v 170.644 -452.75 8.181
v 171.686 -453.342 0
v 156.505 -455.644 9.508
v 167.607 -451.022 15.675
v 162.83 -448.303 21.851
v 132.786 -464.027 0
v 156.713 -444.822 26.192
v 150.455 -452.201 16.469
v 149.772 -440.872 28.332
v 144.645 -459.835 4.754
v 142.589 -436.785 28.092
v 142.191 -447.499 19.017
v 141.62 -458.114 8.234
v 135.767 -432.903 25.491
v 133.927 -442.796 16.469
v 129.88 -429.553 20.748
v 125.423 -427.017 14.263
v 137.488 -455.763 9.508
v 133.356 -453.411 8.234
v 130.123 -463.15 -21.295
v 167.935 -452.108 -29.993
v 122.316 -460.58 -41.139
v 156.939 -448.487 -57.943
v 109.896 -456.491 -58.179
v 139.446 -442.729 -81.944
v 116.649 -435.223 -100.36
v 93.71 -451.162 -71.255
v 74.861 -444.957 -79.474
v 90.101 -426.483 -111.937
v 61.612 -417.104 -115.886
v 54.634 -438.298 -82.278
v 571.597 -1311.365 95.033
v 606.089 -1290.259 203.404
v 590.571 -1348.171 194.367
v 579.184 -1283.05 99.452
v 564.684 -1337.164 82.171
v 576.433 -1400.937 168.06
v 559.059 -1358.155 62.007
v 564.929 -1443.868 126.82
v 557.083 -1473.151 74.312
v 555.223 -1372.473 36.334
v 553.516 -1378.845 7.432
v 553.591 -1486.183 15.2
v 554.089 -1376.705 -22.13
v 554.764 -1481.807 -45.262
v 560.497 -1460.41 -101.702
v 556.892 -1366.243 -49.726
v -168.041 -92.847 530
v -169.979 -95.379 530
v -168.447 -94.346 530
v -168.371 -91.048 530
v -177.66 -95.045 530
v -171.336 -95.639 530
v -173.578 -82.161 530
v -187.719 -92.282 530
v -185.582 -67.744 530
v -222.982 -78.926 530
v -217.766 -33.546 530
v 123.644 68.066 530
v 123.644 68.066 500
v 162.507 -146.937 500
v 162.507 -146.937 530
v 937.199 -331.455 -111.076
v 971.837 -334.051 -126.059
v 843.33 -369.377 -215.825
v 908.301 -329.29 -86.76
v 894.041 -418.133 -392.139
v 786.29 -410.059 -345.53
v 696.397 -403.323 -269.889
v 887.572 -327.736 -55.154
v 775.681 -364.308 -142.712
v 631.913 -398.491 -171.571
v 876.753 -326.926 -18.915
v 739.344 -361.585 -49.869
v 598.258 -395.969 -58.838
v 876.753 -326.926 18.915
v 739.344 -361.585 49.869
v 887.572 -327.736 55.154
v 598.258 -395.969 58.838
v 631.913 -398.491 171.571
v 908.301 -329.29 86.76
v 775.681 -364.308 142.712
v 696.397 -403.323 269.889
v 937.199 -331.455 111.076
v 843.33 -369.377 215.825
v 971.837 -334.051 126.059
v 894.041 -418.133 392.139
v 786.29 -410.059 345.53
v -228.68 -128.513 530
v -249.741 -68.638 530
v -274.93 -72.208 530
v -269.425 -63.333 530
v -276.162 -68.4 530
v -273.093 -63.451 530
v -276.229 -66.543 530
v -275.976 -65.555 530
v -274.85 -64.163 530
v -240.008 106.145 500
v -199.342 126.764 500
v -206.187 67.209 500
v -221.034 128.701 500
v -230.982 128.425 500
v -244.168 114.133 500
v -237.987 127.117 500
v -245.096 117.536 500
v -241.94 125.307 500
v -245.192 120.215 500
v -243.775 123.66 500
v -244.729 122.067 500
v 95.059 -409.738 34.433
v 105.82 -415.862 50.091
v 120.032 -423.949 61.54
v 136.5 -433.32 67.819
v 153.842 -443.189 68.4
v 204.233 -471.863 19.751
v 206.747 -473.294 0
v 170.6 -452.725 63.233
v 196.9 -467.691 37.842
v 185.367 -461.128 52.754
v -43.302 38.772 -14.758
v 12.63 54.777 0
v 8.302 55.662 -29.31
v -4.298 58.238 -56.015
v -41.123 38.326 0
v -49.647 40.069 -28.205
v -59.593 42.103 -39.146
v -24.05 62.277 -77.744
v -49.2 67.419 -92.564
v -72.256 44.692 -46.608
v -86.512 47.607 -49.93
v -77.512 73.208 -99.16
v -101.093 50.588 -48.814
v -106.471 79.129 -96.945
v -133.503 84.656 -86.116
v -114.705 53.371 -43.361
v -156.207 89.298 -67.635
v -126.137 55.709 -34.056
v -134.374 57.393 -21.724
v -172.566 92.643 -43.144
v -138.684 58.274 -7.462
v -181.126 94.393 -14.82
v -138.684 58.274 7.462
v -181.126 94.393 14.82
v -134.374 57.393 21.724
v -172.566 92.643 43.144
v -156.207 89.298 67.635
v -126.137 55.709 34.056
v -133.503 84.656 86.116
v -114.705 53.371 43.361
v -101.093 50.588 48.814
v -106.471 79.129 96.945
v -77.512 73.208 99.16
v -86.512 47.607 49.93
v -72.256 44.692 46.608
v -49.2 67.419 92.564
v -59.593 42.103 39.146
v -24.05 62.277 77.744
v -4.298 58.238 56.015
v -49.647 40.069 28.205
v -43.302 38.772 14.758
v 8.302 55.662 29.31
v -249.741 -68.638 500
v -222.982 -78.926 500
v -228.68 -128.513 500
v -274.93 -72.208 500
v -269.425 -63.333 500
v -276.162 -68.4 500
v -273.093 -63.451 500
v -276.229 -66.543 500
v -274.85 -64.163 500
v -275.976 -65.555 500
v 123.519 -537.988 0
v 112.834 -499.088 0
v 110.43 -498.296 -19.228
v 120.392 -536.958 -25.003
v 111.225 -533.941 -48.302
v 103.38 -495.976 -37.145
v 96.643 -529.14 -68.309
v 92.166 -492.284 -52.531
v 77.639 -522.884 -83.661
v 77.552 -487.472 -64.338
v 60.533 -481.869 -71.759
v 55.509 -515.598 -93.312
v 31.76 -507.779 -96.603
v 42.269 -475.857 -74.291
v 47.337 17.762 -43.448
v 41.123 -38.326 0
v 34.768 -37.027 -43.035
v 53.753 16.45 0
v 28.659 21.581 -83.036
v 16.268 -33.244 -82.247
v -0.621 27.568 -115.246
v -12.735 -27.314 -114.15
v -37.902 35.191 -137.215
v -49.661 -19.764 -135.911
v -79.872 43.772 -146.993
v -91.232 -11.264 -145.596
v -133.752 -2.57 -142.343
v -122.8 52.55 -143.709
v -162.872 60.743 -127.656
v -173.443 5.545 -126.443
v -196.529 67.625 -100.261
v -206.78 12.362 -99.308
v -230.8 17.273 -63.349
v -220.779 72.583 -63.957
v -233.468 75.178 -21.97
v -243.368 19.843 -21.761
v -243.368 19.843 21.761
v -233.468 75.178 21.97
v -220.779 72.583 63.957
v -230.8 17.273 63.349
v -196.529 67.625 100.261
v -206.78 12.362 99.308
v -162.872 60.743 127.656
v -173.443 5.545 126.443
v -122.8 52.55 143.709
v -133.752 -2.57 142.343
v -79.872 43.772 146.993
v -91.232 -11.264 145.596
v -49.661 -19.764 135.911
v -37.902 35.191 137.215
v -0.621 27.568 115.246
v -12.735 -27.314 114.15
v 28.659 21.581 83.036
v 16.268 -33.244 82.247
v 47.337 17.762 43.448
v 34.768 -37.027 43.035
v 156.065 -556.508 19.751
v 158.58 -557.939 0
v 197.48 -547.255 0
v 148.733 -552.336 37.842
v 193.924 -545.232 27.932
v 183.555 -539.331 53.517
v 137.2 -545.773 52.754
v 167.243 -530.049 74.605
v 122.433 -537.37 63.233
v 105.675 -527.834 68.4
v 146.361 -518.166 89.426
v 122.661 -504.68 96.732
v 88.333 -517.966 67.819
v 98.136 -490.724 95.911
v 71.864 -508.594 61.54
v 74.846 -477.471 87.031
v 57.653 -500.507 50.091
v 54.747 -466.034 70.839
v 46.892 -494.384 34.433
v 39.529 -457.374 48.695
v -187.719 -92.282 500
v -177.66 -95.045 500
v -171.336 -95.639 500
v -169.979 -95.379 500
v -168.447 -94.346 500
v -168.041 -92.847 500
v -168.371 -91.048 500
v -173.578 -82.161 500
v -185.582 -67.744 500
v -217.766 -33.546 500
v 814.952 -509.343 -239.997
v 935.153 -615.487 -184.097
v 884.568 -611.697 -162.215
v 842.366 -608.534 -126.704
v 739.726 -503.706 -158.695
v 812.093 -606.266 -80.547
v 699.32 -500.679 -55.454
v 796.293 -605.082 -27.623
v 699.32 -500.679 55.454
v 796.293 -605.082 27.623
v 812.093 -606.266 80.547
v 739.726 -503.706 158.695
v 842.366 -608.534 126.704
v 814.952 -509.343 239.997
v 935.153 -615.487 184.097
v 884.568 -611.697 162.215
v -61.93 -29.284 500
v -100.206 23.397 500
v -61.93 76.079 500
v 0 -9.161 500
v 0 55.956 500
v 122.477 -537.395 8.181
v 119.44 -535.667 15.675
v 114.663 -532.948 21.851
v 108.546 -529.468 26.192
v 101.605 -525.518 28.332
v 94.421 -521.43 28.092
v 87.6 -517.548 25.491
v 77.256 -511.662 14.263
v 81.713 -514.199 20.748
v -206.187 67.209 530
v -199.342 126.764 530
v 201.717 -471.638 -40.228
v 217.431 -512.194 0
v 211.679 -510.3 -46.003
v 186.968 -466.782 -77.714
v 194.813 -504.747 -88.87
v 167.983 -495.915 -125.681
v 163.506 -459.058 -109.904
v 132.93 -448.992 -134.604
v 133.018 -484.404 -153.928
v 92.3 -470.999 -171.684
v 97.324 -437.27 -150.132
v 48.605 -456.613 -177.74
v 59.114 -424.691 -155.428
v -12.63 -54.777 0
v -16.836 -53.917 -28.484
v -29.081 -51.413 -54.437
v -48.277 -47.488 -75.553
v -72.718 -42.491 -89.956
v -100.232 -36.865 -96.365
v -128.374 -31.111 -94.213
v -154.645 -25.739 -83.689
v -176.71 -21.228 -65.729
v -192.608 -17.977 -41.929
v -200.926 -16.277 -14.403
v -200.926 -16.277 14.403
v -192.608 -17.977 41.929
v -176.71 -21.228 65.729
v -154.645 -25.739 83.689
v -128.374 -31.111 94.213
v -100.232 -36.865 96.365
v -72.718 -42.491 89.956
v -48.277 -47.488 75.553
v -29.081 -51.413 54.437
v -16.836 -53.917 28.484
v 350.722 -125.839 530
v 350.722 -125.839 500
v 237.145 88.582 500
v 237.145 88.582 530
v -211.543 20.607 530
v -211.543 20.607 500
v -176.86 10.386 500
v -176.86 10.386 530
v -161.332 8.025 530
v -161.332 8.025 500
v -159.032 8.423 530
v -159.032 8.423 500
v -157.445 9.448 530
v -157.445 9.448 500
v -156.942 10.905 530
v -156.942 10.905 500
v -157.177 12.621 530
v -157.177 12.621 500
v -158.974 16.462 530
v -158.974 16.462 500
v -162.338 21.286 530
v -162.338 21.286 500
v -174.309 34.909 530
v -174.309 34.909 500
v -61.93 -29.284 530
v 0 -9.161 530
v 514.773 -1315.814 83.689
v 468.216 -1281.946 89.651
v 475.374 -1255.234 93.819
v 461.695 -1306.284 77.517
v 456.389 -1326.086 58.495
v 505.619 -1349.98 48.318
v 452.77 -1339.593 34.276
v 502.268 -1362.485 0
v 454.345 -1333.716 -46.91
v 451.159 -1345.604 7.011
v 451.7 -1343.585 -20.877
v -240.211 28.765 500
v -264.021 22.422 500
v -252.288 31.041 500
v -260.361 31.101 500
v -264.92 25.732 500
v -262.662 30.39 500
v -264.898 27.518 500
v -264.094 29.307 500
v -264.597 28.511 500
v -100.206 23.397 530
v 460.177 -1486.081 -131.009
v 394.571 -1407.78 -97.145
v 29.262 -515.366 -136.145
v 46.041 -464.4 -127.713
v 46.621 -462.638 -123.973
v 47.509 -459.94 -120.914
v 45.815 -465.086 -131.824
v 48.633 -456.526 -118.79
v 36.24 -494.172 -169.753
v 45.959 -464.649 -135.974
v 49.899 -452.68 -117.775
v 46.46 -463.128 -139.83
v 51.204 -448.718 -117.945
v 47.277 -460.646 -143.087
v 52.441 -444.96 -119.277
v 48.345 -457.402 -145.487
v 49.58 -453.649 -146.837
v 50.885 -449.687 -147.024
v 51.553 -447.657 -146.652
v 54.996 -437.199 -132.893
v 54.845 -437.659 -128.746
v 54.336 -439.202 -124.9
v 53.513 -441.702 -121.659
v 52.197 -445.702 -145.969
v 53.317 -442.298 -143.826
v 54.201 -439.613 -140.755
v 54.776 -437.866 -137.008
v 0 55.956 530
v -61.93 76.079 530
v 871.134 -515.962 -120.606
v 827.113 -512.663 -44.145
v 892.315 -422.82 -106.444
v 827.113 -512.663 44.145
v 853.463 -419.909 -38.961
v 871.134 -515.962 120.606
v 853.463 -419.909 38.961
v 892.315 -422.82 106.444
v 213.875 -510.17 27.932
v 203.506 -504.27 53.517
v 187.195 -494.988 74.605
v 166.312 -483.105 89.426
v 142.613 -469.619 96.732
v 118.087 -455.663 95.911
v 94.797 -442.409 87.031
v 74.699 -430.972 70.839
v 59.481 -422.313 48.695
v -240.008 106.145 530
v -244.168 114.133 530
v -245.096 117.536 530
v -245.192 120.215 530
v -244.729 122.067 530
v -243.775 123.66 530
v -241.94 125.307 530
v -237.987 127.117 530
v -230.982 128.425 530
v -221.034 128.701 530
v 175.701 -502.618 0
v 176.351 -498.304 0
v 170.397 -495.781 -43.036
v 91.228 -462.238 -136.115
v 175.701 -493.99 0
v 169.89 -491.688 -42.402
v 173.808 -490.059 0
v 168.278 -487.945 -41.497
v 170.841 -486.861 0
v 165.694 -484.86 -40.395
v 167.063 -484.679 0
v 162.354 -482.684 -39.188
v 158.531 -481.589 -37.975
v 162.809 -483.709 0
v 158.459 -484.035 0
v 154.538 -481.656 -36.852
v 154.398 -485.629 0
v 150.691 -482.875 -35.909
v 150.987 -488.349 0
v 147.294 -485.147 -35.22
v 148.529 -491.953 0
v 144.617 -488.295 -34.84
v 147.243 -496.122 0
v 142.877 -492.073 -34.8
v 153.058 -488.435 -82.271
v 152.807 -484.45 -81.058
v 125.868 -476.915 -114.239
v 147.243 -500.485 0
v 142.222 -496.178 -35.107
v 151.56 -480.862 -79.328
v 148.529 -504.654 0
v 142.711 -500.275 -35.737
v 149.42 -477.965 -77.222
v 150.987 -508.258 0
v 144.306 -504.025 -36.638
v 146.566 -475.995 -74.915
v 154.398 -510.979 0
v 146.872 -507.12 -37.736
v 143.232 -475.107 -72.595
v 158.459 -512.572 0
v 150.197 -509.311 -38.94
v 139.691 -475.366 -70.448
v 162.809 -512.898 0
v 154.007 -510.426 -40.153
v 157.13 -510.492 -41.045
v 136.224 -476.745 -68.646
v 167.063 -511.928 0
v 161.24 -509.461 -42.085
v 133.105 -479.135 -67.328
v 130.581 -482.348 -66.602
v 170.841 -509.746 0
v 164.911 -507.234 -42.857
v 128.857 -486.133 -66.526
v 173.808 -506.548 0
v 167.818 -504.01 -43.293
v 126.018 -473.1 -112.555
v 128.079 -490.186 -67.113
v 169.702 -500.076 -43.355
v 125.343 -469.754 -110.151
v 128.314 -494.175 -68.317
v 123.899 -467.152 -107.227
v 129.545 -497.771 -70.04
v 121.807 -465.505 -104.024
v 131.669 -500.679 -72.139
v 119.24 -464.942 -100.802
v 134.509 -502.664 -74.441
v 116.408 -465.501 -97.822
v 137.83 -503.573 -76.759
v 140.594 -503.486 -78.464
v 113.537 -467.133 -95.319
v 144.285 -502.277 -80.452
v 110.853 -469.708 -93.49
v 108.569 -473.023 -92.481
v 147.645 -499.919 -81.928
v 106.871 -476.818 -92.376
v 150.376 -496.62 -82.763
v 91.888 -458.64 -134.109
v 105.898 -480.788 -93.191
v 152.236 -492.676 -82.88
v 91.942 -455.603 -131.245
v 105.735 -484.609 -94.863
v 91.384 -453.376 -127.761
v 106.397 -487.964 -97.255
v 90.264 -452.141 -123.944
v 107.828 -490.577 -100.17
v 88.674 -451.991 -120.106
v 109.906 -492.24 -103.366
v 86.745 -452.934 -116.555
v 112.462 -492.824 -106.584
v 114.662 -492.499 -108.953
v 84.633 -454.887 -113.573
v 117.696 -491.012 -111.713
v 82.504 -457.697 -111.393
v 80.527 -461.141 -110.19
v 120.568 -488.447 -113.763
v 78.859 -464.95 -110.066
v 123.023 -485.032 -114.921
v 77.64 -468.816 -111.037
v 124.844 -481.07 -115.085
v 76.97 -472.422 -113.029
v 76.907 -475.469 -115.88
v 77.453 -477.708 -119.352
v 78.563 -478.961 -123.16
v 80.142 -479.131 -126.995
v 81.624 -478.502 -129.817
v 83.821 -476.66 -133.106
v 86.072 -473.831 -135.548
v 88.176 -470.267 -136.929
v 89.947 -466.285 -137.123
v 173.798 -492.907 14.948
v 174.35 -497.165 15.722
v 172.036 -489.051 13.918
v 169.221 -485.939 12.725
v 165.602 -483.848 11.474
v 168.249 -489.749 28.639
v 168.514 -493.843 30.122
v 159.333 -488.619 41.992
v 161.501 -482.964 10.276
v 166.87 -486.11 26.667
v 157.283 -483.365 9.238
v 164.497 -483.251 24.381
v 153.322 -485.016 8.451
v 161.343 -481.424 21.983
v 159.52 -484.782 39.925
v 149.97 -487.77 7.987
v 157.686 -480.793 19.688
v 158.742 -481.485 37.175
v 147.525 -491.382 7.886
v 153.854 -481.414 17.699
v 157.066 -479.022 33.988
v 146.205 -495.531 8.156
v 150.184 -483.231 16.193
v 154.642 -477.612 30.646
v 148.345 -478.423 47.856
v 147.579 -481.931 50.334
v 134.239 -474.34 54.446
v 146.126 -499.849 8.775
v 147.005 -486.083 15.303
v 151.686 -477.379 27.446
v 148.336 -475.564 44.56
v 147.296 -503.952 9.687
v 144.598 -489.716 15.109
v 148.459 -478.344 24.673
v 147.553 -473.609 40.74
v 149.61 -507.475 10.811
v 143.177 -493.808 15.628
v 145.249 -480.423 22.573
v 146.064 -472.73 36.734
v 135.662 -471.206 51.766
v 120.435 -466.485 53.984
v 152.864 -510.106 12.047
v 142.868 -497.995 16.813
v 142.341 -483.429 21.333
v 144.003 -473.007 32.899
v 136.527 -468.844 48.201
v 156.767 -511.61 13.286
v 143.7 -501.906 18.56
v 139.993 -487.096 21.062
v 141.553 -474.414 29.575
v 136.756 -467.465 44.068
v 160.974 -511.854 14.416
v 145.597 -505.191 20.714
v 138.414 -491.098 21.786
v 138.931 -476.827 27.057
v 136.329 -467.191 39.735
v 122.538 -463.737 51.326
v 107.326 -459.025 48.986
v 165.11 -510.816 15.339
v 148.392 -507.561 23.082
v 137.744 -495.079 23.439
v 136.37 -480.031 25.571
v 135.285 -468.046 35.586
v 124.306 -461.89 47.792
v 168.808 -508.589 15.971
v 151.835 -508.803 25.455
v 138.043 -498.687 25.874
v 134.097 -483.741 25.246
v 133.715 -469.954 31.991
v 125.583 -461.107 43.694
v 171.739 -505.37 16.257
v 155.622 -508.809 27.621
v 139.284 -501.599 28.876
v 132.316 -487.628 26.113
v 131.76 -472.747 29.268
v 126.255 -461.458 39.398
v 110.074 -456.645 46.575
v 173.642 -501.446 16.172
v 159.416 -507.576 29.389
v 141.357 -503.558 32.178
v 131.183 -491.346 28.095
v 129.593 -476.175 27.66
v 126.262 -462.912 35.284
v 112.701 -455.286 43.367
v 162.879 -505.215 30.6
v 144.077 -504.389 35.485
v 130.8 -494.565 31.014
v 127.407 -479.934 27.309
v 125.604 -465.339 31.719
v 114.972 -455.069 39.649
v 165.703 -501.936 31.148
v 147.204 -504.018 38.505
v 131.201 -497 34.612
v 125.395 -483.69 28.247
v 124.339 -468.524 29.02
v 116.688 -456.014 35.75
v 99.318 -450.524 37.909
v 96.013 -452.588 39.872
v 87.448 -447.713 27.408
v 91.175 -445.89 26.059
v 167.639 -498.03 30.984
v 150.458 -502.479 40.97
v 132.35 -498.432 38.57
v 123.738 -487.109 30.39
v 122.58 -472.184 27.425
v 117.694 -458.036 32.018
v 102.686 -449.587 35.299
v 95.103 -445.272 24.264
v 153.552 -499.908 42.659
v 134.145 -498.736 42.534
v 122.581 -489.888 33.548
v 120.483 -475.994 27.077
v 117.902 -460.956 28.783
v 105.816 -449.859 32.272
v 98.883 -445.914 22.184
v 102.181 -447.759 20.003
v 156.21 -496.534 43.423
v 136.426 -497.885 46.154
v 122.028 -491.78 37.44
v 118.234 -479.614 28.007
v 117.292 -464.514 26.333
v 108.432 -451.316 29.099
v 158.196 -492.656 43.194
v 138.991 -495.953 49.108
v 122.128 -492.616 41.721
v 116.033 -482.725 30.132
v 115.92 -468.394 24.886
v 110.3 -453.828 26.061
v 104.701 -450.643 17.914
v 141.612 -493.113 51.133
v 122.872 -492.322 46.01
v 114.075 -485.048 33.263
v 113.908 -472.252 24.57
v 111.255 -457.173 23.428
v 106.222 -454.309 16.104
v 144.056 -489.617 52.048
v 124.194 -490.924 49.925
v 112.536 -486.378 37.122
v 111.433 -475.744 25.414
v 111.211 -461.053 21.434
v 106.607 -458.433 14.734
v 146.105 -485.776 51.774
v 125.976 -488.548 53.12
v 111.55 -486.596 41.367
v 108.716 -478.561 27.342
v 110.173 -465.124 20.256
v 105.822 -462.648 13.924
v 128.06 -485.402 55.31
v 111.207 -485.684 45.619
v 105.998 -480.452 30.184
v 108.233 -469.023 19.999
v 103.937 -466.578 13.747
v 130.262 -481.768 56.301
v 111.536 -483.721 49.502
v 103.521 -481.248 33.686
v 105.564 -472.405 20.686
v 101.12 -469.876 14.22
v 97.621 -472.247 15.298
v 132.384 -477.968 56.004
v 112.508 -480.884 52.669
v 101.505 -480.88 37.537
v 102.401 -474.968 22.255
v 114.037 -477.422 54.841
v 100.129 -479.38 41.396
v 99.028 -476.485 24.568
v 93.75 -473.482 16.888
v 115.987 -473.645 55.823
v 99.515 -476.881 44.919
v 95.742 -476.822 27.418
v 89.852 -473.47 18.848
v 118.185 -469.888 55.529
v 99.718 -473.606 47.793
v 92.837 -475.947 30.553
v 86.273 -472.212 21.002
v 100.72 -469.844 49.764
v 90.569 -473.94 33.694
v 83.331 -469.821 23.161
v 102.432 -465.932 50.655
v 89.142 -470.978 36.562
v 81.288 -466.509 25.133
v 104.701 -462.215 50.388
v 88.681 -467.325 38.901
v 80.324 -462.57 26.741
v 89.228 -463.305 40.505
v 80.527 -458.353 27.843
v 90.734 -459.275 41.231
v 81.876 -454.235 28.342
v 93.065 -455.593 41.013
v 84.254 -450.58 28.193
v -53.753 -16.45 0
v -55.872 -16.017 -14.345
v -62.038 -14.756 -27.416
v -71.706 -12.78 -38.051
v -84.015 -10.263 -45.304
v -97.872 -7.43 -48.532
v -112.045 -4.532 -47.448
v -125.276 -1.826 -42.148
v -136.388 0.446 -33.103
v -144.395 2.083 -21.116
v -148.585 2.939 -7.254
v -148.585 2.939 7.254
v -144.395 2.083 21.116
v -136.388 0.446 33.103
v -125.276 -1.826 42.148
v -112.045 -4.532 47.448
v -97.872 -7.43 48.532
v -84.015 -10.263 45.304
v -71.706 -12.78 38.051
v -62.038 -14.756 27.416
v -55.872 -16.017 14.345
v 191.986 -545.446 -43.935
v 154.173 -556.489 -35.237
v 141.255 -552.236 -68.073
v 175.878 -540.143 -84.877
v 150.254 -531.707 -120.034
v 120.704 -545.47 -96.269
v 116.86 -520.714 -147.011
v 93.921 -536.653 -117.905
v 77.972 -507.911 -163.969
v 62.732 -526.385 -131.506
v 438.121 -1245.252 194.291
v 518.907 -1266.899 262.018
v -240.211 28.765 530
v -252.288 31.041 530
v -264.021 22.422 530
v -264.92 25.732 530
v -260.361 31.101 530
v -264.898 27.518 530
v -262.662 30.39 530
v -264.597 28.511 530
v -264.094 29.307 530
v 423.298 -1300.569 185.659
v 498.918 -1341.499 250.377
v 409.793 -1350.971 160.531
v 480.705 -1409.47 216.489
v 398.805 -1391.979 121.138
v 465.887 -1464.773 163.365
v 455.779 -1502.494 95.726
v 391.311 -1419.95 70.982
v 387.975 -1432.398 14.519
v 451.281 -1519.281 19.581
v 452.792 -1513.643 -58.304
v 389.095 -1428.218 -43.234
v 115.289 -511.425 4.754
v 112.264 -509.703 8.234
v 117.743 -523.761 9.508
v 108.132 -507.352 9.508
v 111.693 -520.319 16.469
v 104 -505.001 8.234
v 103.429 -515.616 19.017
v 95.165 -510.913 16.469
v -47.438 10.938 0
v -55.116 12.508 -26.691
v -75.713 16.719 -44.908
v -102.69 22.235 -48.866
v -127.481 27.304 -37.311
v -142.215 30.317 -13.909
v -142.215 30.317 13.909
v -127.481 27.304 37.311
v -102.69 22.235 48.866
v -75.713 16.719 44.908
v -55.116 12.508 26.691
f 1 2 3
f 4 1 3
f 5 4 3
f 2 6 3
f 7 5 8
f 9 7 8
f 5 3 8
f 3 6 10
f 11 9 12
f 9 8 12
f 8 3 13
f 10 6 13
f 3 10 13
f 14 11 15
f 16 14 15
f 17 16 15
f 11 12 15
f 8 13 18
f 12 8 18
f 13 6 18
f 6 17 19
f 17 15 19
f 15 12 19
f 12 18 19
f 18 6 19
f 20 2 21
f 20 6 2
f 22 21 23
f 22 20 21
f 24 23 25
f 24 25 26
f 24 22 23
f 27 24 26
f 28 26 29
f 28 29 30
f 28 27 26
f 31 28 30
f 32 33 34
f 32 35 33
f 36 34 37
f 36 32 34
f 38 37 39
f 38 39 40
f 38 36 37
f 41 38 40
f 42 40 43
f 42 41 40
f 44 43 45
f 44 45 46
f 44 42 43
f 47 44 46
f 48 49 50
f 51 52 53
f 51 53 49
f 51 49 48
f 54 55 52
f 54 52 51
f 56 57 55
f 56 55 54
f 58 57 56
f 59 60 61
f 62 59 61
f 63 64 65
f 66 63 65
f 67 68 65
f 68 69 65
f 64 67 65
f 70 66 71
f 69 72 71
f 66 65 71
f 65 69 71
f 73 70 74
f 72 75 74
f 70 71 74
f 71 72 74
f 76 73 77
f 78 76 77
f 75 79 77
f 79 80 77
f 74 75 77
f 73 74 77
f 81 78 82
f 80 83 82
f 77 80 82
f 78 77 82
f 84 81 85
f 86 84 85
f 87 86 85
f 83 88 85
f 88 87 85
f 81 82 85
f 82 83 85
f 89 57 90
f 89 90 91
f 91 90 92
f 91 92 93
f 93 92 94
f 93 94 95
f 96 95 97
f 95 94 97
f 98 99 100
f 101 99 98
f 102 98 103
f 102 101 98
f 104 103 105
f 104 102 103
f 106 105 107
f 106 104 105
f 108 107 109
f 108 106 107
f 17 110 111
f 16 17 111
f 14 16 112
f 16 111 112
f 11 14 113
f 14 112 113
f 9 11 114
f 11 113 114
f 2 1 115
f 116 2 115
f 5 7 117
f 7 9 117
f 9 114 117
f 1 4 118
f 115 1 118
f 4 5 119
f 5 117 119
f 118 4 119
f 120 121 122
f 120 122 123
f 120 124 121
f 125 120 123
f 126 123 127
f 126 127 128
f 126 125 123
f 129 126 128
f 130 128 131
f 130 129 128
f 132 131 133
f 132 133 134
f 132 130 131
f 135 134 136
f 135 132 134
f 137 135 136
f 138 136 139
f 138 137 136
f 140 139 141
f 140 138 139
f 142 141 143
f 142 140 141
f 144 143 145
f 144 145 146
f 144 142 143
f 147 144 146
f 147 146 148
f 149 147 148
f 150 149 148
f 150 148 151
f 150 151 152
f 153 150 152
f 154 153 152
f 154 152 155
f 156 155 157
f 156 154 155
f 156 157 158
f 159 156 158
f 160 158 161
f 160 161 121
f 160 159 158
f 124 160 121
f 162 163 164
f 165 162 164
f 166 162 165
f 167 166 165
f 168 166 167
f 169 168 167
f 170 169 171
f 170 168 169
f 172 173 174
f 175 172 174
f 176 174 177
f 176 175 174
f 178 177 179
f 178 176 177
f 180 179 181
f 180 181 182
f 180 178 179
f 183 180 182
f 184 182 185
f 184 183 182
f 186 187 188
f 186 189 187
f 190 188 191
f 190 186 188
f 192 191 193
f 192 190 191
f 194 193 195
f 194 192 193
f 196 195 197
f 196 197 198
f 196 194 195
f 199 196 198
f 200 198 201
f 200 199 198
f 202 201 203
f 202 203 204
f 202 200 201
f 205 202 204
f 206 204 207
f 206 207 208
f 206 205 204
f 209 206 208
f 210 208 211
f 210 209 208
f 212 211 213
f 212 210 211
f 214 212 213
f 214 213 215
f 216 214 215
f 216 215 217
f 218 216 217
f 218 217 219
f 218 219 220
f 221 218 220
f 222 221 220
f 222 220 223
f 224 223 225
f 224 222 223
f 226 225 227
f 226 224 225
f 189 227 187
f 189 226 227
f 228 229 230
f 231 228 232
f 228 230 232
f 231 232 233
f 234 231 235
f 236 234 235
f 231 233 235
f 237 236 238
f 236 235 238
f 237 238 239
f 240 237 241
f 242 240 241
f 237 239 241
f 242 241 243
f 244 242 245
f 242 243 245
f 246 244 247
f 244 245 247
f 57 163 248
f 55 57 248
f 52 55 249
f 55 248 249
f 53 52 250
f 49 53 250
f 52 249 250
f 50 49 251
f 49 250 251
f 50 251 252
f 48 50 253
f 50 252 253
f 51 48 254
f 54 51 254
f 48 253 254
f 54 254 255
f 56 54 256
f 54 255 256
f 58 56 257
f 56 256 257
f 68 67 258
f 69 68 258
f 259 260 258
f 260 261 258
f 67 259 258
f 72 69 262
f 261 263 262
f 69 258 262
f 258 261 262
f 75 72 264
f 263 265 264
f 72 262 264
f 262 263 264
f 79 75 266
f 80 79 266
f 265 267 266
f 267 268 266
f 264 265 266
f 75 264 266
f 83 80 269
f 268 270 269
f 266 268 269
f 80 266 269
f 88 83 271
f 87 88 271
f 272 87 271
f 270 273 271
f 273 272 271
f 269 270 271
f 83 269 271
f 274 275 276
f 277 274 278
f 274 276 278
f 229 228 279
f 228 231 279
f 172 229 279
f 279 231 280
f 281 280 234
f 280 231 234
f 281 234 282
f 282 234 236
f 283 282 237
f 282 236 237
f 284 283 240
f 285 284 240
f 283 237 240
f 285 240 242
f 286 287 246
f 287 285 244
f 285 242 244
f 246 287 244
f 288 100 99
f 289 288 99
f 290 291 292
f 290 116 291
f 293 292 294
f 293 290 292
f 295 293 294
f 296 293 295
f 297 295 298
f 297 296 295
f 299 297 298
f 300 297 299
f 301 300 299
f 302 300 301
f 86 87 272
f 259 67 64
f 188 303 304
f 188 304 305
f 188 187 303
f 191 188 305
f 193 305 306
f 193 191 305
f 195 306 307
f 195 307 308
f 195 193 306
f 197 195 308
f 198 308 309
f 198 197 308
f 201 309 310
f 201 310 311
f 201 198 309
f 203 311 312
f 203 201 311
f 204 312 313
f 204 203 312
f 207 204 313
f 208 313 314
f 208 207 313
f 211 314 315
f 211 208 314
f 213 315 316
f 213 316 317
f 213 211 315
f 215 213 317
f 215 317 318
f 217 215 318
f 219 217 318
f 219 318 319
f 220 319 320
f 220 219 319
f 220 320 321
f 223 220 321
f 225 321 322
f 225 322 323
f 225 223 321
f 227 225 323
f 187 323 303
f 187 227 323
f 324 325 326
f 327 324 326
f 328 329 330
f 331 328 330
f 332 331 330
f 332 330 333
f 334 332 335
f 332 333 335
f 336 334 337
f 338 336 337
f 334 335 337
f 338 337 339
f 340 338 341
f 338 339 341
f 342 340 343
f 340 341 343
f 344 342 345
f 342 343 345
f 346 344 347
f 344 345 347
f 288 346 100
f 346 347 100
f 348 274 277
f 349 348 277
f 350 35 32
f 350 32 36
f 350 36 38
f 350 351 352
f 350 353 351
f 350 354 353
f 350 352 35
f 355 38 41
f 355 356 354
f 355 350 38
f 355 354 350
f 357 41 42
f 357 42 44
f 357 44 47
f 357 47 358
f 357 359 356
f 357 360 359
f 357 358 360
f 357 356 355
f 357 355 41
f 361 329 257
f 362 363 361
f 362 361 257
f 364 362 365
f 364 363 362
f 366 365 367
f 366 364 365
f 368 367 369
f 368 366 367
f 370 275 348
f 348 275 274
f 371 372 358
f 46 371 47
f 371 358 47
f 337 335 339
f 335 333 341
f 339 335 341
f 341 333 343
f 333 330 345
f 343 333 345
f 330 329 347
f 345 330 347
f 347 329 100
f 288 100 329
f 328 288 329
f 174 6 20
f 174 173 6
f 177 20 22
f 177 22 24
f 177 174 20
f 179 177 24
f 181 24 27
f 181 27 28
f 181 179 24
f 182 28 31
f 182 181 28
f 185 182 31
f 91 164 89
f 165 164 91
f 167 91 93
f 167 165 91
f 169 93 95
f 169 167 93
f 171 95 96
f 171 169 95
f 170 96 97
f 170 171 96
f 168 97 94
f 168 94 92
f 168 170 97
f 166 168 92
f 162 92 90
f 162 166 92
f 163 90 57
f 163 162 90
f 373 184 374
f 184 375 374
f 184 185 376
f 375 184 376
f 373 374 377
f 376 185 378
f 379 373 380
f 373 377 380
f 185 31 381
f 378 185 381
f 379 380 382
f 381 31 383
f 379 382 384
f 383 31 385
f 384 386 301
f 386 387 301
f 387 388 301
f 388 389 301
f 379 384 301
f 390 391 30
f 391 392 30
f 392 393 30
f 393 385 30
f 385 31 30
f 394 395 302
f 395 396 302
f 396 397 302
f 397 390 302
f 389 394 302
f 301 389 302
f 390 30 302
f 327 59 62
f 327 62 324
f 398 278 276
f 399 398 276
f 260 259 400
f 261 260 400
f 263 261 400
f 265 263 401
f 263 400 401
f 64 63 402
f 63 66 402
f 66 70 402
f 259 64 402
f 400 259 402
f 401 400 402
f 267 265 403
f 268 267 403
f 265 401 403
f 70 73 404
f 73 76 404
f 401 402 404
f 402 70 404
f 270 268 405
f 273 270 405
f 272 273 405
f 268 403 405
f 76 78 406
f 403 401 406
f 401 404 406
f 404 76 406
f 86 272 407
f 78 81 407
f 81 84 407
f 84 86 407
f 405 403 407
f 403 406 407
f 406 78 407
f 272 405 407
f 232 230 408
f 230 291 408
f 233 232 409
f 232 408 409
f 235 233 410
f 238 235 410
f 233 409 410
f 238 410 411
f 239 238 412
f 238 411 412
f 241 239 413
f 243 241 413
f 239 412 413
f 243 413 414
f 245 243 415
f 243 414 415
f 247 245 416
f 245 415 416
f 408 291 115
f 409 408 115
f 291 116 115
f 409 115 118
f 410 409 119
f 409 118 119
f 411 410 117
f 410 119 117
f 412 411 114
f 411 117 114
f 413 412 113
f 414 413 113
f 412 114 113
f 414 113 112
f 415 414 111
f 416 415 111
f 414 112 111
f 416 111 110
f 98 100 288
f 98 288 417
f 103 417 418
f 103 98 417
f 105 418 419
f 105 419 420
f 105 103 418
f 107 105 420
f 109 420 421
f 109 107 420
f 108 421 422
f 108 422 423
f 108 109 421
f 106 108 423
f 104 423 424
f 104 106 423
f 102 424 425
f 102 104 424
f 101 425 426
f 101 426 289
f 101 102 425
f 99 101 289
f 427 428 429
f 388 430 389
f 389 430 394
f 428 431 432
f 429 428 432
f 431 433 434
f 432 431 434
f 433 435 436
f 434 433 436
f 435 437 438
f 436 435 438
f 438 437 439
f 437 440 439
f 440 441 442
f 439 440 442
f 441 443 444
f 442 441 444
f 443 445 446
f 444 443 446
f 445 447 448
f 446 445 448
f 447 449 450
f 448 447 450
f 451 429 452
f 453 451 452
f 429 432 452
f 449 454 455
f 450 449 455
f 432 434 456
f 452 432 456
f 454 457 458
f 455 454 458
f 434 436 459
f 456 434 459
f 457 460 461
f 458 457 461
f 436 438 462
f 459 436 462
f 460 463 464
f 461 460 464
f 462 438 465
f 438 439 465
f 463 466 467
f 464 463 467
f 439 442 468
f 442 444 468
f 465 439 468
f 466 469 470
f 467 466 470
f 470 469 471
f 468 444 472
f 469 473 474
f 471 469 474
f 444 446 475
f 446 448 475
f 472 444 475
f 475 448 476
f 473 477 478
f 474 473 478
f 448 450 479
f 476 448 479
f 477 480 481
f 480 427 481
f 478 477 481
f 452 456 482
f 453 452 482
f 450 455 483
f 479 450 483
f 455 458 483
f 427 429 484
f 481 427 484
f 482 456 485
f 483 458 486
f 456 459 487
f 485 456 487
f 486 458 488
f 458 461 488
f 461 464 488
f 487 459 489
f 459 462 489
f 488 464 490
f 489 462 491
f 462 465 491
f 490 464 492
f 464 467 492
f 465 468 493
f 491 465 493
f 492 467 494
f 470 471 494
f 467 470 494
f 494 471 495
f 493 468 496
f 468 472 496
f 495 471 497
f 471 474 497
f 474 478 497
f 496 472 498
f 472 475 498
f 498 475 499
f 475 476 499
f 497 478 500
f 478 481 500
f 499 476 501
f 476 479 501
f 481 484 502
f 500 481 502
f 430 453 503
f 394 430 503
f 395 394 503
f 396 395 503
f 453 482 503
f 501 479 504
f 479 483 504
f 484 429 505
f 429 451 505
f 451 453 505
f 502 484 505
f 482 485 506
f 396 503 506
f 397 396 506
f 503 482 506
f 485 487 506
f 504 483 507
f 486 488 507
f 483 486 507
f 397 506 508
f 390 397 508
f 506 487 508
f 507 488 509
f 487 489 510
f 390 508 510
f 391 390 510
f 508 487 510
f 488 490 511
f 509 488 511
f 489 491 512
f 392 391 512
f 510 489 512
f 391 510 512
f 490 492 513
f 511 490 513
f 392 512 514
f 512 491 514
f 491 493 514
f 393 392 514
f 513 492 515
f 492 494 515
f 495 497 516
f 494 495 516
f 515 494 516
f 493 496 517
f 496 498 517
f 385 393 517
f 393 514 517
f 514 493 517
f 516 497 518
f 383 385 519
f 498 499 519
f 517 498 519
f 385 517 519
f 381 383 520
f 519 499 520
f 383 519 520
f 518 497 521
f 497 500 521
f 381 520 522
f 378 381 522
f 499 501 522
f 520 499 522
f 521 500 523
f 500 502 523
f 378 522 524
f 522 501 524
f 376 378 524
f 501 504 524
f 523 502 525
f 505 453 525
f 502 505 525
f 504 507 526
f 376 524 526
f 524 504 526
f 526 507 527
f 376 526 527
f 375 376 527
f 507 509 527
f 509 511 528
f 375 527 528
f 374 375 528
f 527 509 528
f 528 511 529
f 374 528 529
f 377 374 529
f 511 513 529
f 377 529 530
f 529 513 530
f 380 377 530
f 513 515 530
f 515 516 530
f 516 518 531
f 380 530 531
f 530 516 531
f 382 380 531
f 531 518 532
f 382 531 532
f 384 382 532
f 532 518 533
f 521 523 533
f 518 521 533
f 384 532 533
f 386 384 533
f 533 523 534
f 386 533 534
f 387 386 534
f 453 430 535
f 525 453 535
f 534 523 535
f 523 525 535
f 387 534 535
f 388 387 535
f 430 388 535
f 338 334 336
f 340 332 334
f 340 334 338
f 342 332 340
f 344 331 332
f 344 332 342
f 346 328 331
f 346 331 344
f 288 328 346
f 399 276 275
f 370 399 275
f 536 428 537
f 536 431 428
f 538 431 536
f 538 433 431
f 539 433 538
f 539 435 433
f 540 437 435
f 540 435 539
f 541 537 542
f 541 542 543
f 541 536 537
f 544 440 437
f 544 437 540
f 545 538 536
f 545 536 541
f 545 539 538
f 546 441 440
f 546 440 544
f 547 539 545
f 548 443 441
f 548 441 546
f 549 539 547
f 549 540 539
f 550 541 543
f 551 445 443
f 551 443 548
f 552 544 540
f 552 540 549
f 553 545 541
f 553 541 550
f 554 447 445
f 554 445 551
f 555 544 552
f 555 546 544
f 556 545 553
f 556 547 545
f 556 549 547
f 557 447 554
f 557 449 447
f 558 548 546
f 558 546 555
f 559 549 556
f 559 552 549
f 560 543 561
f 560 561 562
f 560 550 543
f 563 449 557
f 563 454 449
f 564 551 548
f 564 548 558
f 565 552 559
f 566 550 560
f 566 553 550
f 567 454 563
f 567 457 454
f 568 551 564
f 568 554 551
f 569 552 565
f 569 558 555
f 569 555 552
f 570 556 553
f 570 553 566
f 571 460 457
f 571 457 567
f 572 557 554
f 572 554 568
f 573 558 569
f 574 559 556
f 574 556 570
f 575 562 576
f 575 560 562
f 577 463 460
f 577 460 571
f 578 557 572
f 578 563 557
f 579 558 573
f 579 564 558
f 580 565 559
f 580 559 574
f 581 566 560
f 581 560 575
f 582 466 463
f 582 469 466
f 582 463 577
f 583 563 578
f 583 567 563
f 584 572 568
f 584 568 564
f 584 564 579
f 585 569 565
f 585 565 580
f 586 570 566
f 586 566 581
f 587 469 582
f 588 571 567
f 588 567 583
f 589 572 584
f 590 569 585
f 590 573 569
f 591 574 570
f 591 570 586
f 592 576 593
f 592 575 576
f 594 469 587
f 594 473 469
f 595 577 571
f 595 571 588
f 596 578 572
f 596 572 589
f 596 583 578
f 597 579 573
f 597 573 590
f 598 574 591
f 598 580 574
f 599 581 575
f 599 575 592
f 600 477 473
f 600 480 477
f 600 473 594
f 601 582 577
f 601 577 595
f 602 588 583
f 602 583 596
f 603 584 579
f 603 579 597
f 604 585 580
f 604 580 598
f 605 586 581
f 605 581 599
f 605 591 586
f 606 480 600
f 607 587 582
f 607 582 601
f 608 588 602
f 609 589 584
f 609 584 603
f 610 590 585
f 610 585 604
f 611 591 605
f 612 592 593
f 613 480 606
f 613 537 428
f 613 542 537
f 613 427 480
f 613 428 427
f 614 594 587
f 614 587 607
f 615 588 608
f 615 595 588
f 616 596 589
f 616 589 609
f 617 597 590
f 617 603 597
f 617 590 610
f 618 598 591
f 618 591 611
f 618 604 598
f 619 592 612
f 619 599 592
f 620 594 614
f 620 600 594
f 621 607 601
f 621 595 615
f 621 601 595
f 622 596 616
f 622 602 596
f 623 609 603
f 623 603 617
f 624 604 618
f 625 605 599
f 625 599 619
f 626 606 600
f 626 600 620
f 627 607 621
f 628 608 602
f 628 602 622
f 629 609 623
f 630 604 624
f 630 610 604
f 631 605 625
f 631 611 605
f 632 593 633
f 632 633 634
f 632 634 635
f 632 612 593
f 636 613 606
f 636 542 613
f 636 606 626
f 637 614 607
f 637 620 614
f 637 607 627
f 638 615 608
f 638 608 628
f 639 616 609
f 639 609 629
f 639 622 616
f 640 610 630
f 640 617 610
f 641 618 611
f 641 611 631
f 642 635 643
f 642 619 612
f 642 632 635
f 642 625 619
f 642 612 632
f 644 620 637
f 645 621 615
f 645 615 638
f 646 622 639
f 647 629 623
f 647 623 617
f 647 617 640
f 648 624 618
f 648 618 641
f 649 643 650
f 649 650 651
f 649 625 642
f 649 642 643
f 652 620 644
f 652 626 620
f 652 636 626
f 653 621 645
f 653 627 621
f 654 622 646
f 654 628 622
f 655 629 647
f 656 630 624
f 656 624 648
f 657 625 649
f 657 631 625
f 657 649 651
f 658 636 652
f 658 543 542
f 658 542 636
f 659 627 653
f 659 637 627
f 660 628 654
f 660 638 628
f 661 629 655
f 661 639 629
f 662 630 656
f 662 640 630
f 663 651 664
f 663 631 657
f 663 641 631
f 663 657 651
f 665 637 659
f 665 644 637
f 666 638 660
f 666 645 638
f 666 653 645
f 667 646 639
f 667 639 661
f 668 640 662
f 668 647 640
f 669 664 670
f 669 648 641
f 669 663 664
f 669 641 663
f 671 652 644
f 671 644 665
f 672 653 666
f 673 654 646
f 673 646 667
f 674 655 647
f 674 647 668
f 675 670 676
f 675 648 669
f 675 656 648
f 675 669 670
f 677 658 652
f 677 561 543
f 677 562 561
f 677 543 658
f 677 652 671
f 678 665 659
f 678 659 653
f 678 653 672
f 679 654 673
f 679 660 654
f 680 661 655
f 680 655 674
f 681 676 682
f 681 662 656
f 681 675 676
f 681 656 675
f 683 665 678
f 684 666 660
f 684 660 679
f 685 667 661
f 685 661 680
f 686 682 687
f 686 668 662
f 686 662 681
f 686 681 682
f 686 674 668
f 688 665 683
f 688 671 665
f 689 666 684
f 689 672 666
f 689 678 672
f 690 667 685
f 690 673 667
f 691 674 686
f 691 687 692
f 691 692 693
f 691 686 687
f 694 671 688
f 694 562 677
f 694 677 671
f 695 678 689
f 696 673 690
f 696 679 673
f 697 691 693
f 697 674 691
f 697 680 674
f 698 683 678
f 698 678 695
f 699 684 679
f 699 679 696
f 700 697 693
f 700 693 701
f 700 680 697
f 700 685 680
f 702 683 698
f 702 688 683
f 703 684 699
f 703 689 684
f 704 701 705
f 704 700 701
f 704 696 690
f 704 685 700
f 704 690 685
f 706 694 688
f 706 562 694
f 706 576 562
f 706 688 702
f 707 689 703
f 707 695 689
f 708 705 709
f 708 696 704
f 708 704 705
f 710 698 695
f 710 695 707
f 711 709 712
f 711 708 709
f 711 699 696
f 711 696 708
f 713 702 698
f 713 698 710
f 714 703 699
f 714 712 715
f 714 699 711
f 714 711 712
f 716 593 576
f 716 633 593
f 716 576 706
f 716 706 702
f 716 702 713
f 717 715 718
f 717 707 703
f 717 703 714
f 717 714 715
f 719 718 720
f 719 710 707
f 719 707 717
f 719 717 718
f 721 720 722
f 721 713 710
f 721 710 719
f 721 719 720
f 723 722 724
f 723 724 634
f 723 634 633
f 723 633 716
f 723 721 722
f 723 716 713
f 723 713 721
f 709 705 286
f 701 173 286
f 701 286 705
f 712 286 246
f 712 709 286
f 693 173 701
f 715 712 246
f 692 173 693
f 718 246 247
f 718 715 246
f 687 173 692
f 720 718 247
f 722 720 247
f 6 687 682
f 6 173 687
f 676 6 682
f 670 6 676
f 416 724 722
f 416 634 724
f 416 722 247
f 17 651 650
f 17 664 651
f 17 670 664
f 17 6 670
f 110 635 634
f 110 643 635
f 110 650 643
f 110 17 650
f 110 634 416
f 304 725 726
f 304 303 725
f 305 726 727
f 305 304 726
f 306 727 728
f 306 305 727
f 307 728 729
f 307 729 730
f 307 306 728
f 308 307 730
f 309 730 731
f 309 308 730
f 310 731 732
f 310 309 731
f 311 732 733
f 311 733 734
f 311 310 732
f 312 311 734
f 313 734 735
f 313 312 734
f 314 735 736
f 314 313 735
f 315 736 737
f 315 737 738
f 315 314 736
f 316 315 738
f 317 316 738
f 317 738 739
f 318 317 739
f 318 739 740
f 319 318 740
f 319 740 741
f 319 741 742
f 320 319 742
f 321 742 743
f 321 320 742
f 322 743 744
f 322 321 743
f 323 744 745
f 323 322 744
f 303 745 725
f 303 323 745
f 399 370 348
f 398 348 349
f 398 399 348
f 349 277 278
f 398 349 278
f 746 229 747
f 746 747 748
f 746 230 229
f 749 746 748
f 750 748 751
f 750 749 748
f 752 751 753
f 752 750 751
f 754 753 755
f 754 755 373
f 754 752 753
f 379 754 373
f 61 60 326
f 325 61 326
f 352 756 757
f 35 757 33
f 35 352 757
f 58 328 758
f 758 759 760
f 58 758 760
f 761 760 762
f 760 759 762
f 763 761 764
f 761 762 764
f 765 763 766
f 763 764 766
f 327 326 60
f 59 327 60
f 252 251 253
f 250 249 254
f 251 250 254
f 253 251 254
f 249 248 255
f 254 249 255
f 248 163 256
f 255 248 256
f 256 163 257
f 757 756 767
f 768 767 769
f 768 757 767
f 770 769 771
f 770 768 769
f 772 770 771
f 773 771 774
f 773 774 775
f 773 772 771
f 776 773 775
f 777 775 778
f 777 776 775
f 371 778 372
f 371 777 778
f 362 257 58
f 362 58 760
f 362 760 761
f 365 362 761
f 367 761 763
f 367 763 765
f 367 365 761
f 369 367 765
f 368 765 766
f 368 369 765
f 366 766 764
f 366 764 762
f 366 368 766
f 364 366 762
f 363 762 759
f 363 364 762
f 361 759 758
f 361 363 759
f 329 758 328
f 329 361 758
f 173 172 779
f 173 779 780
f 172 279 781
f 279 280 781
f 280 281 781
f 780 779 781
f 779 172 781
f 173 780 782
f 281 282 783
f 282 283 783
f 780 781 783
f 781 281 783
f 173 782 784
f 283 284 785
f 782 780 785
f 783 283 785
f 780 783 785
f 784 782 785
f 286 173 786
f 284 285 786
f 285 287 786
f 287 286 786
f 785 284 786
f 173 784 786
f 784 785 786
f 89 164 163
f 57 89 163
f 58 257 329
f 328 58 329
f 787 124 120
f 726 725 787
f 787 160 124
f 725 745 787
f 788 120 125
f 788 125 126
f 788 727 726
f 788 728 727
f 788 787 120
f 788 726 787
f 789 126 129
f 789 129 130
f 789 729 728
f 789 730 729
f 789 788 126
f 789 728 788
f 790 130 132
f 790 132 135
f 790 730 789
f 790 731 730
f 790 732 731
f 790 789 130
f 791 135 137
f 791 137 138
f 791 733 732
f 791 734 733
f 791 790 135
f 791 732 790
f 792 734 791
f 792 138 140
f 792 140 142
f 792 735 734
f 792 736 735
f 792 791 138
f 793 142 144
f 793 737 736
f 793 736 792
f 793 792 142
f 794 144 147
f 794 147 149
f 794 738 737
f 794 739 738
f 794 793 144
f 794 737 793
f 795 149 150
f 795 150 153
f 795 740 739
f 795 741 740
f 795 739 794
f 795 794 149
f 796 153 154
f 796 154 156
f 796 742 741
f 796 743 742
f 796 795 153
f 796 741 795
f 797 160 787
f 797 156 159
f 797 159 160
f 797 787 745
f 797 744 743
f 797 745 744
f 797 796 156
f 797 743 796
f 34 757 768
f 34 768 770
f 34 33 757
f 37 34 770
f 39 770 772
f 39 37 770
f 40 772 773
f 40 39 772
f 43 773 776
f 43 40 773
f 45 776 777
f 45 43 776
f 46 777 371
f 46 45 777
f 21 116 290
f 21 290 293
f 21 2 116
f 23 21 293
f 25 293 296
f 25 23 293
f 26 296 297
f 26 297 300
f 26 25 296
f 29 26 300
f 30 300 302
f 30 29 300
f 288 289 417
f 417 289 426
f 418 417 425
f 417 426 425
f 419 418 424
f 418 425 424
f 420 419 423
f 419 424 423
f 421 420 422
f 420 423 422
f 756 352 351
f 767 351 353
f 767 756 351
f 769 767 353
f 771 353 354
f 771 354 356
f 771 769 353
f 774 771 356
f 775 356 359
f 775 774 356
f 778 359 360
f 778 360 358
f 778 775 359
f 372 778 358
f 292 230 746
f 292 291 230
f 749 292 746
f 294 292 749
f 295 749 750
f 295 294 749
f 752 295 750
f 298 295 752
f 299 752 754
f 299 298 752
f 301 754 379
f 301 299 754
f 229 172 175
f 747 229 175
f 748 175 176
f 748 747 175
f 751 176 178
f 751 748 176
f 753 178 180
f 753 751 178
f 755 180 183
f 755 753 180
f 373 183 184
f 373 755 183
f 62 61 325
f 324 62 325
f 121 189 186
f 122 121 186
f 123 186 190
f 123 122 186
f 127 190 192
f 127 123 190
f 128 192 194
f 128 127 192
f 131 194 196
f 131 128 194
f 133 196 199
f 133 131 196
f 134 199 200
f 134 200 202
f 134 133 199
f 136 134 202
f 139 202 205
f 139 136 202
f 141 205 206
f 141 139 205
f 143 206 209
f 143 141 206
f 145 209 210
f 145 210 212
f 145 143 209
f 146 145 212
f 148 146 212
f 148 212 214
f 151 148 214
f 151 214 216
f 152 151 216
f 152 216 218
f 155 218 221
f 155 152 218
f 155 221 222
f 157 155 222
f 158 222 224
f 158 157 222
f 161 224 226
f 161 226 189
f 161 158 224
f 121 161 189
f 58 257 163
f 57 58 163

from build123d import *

# Parameters (mm, degrees)
F4_ANGLE       = 90
F5_R           = 14.6358419548
F6_ANGLE       = 90
F4_FACE_R      = 14.6358419548
F7_ANGLE       = 150
F9_ANGLE_BACK  = 75
F9_ANGLE       = 150
F11_ANGLE_BACK = 90
F11_ANGLE      = 120
F14_DEPTH      = 30


with BuildPart() as f2:
    # F0 (on Top) → F2 (revolve)
    with BuildSketch(Plane.XY):
        Polygon((41.1230984632, -38.3263548902), (53.753146201, 16.4504705063), (12.6300477378, 54.7768253966), (-41.1230984632, 38.3263548902), (-53.753146201, -16.4504705063), (-12.6300477378, -54.7768253966), align=None)
    revolve(axis=Axis((-101.0606586933, -4.8696771264, 0), (0.2003221404, 0.9797300853, 0)))


with BuildPart() as f4:
    # F3 (on Top) → F4 (revolve)
    with BuildSketch(Plane.XY):
        Polygon((197.4797659549, -547.2550534879), (217.4312359658, -512.1937847461), (206.7469948207, -473.2939041224), (171.6857260789, -453.3424341116), (132.7858454552, -464.0266752566), (112.8343754444, -499.0879439985), (123.5186165894, -537.9878246221), (158.5798853313, -557.939294633), align=None)
    revolve(axis=Axis((33.4474323317, -502.6533901691, 0), (0.3127058951, 0.9498500004, 0)), revolution_arc=F4_ANGLE)

    # F5 (on face) → F6 (revolve, cut)
    with BuildSketch(Plane.XY):
        with Locations((161.7156416178, -498.3035624027)):
            Circle(F5_R)
    revolve(axis=Axis((2.8462186456, -532.4731618166, 0), (0.3901119624, 0.9207674282, 0)), revolution_arc=F6_ANGLE, mode=Mode.SUBTRACT)

    # F4_face (on face) → F7 (revolve)
    with BuildSketch(Plane(origin=(165.1328057051, -505.6408643723, 0), x_dir=(1, 0, 0), z_dir=(0, 0, 1))):
        Polygon((-6.5529203738, -52.2984302607), (32.3469602499, -41.6141891156), (52.2984302607, -6.5529203738), (41.6141891156, 32.3469602499), (6.5529203738, 52.2984302607), (-32.3469602499, 41.6141891156), (-52.2984302607, 6.5529203738), (-41.6141891156, -32.3469602499), align=None)
        with Locations((-3.4171640873, 7.3373019695)):
            Circle(F4_FACE_R, mode=Mode.SUBTRACT)
    revolve(axis=Axis((122.8101104498, -481.5573096275, 0), (-0.4945770036, -0.8691338145, 0)), revolution_arc=F7_ANGLE)


with BuildPart() as f9:
    # F8 (on Top) → F9 (revolve)
    with BuildSketch(Plane.XY, mode=Mode.PRIVATE) as f9_sk:
        Polygon((794.2860190573, -604.9314438156), (875.3789599237, -326.8226088234), (593.9831733704, -395.6484794617), align=None)
    revolve(f9_sk.sketch.rotate(Axis((999.4233250618, -417.9402664304, 0), (0.0747248131, 0.9972041929, 0)), -F9_ANGLE_BACK), axis=Axis((999.4233250618, -417.9402664304, 0), (0.0747248131, 0.9972041929, 0)), revolution_arc=F9_ANGLE)


with BuildPart() as f11:
    # F10 (on Top) → F11 (revolve)
    with BuildSketch(Plane.XY, mode=Mode.PRIVATE) as f11_sk:
        Polygon((553.4437894821, -1486.7327075837), (553.4437894821, -1379.1132110717), (451.091566044, -1345.8569577235), (387.8344131352, -1432.9229593277), (451.091566044, -1519.9889609319), align=None)
    revolve(f11_sk.sketch.rotate(Axis((527.5831520557, -1269.2239284515, 0), (0.965925812, -0.2588190985, 0)), -F11_ANGLE_BACK), axis=Axis((527.5831520557, -1269.2239284515, 0), (0.965925812, -0.2588190985, 0)), revolution_arc=F11_ANGLE)


with BuildPart() as f14:
    # F13 (on offset) → F14 (new body)
    with BuildSketch(Plane.XY.offset(500)):
        with BuildLine():
            Line((-217.7661401576, -33.5455555877), (-222.981637236, -78.9262926005))
            add(Edge.make_bspline(
                [(-222.981637236, -78.9262926005), (-196.5505352641, -89.4817884221), (-141.6766181094, -111.7122441999), (-192.3299561226, -60.2015441708), (-217.7661401576, -33.5455555877)],
                knots=[0.2218975102, 0.2218975102, 0.2218975102, 0.2218975102, 0.3112566363, 0.4047462295, 0.4047462295, 0.4047462295, 0.4047462295], degree=3))
        make_face()
    extrude(amount=F14_DEPTH)


with BuildPart() as f14b:
    # F13 (on offset) → F14, piece 2 (new body)
    with BuildSketch(Plane.XY.offset(500)):
        with BuildLine():
            add(Edge.make_bspline(
                [(-217.7661401576, -33.5455555877), (-243.8043538988, -6.2586666717), (-290.1264285124, 43.8113513039), (-235.981118483, 28.1504020808), (-211.5425076347, 20.6071026421)],
                knots=[0.4047462295, 0.4047462295, 0.4047462295, 0.4047462295, 0.5004485567, 0.5782308135, 0.5782308135, 0.5782308135, 0.5782308135], degree=3))
            Line((-217.7661401576, -33.5455555877), (-211.5425076347, 20.6071026421))
        make_face()
    extrude(amount=F14_DEPTH)


with BuildPart() as f14c:
    # F13 (on offset) → F14, piece 3 (new body)
    with BuildSketch(Plane.XY.offset(500)):
        with BuildLine():
            Line((-206.1866159048, 67.2094322784), (-211.5425076347, 20.6071026421))
            add(Edge.make_bspline(
                [(-211.5425076347, 20.6071026421), (-186.3334425436, 12.8259923437), (-130.1996552533, -5.6100716398), (-180.767739603, 41.371800285), (-206.1866159048, 67.2094322784)],
                knots=[0.5782308135, 0.5782308135, 0.5782308135, 0.5782308135, 0.658465242, 0.7556747426, 0.7556747426, 0.7556747426, 0.7556747426], degree=3))
        make_face()
    extrude(amount=F14_DEPTH)


with BuildPart() as f14d:
    # F13 (on offset) → F14, piece 4 (new body)
    with BuildSketch(Plane.XY.offset(500)):
        with BuildLine():
            add(Edge.make_bspline(
                [(-228.6804609973, -128.5125196666), (-261.3239550438, -93.8163487786), (-301.1803779267, -47.9576834287), (-243.0413046828, -70.9152858652), (-222.981637236, -78.9262926005)],
                knots=[0.0231356612, 0.0231356612, 0.0231356612, 0.0231356612, 0.1540791365, 0.2218975102, 0.2218975102, 0.2218975102, 0.2218975102], degree=3))
            Line((-228.6804609973, -128.5125196666), (-222.981637236, -78.9262926005))
        make_face()
    extrude(amount=F14_DEPTH)


with BuildPart() as f14e:
    # F13 (on offset) → F14, piece 5 (new body)
    with BuildSketch(Plane.XY.offset(500)):
        with BuildLine():
            add(Edge.make_bspline(
                [(-206.1866159048, 67.2094322784), (-228.0282713603, 89.4109115684), (-266.1057159013, 131.4926883625), (-220.4806079495, 129.6051543175), (-199.3421153564, 126.7643461625)],
                knots=[0.7556747426, 0.7556747426, 0.7556747426, 0.7556747426, 0.8392038646, 0.9134780452, 0.9134780452, 0.9134780452, 0.9134780452], degree=3))
            Line((-206.1866159048, 67.2094322784), (-199.3421153564, 126.7643461625))
        make_face()
    extrude(amount=F14_DEPTH)


with BuildPart() as f14f:
    # F13 (on offset) → F14, piece 6 (new body)
    with BuildSketch(Plane.XY.offset(500)):
        Polygon((0, -9.1613249574), (0, 55.9562461171), (-61.9304902957, 76.0786822116), (-100.2056382385, 23.3974605799), (-61.9304902957, -29.2837610518), align=None)
    extrude(amount=F14_DEPTH)


with BuildPart() as f14g:
    # F13 (on offset) → F14, piece 7 (new body)
    with BuildSketch(Plane.XY.offset(500)):
        Polygon((123.6441805959, 68.0656582117), (162.50743549, -146.9373577591), (350.7219277197, -125.8394022214), (237.144747892, 88.5816563597), align=None)
    extrude(amount=F14_DEPTH)


solid = Compound([f2.part, f4.part, f9.part, f11.part, f14.part, f14b.part, f14c.part, f14d.part, f14e.part, f14f.part, f14g.part])
